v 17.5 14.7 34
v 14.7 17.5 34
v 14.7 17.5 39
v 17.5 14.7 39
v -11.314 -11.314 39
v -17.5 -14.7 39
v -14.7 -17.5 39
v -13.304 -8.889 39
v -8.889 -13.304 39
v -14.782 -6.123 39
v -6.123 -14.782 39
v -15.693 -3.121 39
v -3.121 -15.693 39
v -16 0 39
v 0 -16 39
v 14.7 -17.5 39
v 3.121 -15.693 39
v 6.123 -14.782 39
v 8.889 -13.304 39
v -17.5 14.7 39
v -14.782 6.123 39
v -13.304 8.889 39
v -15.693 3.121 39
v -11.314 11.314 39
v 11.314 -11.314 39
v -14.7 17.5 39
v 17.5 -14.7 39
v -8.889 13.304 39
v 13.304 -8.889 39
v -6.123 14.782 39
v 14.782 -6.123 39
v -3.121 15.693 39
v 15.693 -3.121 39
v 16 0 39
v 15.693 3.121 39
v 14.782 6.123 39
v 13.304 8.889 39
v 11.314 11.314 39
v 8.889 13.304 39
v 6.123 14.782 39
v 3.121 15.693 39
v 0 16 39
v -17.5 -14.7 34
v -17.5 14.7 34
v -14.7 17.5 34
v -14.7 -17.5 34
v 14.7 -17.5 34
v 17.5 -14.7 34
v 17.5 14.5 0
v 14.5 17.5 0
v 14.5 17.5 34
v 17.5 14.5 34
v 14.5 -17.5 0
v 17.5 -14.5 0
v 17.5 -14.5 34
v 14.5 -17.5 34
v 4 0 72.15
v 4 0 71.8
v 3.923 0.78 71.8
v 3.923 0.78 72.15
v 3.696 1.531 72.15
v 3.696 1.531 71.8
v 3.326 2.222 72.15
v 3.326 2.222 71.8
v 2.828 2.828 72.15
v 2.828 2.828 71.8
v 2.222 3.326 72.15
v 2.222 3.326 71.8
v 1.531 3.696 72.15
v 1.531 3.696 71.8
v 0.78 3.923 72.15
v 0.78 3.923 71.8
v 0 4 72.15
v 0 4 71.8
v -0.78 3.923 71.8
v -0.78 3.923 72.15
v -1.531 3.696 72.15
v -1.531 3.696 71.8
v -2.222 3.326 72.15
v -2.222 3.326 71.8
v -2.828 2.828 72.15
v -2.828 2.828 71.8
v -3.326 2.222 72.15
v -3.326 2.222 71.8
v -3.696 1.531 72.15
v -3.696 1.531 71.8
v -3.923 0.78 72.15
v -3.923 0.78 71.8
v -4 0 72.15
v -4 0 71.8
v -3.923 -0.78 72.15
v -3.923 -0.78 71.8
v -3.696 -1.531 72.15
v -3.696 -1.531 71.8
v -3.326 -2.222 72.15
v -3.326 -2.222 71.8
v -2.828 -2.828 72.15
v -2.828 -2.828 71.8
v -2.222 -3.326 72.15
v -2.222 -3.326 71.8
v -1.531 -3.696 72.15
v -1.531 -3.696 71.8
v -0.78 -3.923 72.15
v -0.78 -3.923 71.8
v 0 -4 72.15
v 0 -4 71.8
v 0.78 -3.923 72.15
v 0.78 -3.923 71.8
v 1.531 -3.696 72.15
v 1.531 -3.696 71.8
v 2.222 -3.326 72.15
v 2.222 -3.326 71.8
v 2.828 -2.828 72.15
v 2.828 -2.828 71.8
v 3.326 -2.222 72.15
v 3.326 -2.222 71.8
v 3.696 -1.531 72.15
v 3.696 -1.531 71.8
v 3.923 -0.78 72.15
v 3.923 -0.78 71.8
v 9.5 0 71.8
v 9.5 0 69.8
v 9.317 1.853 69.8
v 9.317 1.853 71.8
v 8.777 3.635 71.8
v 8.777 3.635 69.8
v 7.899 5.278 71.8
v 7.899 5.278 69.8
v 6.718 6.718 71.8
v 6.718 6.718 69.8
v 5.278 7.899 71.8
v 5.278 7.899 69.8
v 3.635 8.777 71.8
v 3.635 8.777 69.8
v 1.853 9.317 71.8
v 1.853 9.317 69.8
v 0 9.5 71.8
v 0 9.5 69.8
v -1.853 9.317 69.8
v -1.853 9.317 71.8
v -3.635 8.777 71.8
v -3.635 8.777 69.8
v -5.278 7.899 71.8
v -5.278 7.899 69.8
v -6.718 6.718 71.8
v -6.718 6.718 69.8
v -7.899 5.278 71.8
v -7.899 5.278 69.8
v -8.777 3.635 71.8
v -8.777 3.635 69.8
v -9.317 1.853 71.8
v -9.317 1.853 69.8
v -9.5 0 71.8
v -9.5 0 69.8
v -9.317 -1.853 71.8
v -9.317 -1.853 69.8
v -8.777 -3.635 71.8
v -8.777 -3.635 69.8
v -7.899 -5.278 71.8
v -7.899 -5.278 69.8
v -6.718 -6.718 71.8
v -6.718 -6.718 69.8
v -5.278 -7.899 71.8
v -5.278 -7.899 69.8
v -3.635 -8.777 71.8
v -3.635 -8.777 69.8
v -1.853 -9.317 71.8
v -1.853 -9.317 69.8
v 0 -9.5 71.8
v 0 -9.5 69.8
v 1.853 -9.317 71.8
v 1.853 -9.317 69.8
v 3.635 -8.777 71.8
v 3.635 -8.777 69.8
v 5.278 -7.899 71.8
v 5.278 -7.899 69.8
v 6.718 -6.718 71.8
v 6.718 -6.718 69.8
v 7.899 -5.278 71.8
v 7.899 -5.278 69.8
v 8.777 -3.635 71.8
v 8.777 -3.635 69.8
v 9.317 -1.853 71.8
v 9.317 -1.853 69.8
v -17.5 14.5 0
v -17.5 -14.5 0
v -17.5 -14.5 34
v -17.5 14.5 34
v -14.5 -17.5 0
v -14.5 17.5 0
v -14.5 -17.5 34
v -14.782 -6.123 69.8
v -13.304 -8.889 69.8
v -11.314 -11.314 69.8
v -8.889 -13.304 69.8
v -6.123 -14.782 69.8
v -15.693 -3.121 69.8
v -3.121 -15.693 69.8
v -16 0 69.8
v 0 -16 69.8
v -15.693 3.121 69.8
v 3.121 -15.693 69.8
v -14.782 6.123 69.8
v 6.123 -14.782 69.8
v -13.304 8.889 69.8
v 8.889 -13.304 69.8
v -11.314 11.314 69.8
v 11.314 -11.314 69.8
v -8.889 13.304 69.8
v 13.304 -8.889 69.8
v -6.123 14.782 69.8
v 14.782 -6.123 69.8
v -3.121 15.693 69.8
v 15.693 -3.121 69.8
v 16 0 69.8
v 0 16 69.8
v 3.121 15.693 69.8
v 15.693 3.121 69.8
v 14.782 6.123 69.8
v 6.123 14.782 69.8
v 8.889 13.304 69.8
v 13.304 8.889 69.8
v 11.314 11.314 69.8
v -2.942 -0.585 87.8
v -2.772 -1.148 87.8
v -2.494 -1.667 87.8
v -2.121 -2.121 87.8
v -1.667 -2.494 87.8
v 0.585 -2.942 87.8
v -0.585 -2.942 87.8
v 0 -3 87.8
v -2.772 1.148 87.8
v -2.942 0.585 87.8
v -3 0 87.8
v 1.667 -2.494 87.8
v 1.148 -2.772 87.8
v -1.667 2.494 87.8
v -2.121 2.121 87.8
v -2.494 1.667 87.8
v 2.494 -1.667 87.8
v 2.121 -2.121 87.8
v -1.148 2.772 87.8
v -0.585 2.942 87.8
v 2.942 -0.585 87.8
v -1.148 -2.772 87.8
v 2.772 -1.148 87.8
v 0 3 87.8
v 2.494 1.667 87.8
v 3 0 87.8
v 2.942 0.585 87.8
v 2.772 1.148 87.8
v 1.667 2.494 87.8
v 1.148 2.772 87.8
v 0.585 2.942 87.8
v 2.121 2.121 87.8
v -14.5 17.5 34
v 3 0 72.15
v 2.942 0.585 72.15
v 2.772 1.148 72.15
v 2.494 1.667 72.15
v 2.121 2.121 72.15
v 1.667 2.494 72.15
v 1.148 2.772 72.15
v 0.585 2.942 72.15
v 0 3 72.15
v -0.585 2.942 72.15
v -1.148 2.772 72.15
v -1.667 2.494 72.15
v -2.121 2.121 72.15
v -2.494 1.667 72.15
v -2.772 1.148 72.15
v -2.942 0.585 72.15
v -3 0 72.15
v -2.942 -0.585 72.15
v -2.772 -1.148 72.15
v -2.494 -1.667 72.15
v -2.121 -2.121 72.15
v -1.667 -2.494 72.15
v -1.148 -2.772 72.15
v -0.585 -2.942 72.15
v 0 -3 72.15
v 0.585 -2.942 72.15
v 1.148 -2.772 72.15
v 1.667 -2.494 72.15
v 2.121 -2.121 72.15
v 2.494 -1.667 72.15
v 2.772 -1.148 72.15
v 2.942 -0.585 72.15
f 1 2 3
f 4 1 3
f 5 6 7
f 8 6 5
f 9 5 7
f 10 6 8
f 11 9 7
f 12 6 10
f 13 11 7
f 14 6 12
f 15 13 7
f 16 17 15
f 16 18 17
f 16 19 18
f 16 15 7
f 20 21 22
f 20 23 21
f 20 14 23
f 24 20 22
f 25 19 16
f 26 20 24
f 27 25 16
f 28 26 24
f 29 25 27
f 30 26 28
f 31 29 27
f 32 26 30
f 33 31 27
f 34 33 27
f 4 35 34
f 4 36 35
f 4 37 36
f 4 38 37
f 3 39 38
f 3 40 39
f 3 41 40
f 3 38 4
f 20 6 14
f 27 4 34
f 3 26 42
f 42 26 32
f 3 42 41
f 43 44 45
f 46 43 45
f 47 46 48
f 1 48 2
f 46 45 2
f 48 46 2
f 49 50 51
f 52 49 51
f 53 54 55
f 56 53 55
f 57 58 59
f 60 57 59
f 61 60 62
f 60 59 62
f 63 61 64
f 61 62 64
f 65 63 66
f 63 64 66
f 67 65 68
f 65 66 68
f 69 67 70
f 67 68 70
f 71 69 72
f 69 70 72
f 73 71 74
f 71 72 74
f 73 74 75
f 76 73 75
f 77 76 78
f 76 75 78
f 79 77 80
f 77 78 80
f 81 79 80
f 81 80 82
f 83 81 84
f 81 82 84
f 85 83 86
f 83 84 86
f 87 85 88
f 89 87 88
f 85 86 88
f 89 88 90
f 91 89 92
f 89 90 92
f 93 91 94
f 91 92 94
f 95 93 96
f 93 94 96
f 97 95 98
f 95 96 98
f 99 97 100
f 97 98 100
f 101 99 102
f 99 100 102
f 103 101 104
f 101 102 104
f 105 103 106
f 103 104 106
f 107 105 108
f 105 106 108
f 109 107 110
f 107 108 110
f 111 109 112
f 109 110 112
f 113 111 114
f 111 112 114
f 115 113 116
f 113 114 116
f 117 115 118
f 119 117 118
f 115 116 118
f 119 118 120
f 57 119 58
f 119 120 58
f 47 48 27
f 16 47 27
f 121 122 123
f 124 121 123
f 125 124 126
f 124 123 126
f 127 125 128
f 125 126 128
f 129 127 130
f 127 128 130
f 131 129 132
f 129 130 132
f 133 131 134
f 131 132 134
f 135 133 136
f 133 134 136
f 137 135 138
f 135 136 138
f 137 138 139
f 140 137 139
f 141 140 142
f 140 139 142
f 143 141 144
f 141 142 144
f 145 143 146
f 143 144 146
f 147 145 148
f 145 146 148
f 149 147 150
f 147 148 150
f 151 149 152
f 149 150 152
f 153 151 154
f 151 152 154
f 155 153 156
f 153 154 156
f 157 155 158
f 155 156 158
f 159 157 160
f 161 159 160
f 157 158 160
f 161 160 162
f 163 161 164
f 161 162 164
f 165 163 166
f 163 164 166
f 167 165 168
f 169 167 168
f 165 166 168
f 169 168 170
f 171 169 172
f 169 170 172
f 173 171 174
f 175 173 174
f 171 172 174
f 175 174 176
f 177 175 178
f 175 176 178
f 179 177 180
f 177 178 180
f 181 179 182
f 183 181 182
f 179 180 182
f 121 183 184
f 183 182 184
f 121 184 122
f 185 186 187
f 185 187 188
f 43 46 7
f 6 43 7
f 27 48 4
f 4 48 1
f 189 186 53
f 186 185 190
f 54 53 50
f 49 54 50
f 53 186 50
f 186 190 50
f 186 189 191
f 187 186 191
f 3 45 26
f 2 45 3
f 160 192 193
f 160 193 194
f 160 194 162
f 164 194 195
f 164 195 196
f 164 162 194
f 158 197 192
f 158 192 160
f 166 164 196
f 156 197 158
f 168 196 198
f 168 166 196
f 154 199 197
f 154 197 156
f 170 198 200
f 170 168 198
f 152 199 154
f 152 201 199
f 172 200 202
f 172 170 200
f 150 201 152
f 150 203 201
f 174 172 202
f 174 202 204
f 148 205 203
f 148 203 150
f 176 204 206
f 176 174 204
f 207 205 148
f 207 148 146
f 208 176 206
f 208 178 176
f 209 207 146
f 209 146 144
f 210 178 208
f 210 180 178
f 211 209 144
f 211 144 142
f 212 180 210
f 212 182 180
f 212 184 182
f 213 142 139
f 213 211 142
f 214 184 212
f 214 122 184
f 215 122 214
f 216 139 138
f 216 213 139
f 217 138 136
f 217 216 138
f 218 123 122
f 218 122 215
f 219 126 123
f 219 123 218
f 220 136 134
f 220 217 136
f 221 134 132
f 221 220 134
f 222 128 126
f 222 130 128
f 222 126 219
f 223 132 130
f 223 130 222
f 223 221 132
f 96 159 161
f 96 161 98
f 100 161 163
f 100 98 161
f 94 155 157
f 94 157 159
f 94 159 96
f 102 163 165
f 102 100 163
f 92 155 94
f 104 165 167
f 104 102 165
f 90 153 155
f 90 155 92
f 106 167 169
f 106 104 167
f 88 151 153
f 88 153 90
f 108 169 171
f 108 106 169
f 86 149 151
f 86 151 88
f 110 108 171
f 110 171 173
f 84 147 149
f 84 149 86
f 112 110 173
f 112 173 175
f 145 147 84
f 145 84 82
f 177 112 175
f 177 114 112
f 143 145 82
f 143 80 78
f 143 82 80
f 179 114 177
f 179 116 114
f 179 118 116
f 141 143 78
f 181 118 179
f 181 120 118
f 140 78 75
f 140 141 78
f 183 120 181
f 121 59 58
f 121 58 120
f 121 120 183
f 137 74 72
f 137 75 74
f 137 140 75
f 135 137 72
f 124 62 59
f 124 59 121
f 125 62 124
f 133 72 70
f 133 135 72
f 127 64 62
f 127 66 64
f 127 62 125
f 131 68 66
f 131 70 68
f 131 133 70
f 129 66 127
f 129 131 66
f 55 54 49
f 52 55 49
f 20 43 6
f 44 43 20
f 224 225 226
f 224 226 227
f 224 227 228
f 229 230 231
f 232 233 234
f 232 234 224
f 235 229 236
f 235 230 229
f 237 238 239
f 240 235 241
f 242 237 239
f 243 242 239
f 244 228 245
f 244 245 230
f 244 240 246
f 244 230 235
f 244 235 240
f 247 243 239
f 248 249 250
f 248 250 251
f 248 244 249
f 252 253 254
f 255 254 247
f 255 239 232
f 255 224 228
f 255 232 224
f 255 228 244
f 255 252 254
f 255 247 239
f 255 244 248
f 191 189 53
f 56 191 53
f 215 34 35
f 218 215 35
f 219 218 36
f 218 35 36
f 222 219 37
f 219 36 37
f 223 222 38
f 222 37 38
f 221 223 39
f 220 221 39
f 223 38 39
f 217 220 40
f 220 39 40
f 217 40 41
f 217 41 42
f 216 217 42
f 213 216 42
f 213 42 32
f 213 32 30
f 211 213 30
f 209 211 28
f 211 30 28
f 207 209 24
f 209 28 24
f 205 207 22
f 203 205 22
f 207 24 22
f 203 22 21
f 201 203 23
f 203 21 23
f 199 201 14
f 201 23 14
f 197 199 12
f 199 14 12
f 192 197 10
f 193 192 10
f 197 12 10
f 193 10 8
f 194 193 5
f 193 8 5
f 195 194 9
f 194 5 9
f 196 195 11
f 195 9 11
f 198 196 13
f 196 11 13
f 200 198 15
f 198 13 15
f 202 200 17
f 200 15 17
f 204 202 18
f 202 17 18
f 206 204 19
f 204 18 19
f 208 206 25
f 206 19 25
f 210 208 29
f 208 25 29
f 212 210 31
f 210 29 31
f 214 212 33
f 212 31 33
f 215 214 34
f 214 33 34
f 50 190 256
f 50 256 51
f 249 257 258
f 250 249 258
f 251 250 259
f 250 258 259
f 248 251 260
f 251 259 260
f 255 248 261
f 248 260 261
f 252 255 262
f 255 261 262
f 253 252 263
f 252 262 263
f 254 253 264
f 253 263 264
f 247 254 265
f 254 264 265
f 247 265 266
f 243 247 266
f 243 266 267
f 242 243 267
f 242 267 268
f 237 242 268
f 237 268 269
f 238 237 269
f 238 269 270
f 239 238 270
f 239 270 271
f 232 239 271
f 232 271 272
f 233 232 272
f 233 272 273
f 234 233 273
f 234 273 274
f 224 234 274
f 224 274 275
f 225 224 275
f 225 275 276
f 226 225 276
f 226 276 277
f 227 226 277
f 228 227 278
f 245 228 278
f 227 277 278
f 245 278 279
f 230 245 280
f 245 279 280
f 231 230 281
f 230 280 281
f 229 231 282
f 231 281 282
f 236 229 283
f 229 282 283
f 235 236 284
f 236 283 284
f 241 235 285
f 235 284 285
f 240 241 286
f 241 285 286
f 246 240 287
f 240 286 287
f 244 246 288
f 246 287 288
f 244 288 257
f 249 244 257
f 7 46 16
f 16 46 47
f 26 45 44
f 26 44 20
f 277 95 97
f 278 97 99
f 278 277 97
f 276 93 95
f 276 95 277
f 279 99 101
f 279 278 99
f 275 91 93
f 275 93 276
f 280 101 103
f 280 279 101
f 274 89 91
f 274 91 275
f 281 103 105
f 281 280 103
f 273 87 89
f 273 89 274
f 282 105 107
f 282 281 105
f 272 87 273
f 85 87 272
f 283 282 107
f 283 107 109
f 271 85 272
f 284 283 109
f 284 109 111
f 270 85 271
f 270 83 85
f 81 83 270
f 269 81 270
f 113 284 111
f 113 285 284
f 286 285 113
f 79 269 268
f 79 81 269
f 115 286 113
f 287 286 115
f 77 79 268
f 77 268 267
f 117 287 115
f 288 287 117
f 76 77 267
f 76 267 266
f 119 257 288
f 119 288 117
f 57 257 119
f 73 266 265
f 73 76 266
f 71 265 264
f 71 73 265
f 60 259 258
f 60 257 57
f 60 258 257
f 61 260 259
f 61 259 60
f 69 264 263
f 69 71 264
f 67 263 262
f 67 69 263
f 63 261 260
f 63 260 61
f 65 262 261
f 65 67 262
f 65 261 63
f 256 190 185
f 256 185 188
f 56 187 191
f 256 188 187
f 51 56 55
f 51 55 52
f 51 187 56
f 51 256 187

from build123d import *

# Parameters (mm, degrees)
SKETCH1_W           = 35
SKETCH1_H           = 35
BOSS_EXTRUDE1_DEPTH = 34
CHAMFER1_SIZE       = 3
SKETCH2_W           = 35
SKETCH2_H           = 35
BOSS_EXTRUDE2_DEPTH = 5
CHAMFER2_SIZE       = 2.8
SKETCH3_R           = 16
BOSS_EXTRUDE3_DEPTH = 30.8
SKETCH4_R           = 9.5
BOSS_EXTRUDE4_DEPTH = 2
SKETCH6_R           = 3
BOSS_EXTRUDE5_DEPTH = 18
SKETCH7_R           = 4
BOSS_EXTRUDE6_DEPTH = 0.35


with BuildPart() as part:
    # Sketch1 → Boss-Extrude1 (new body)
    with BuildSketch(Plane.XY):
        Rectangle(SKETCH1_W, SKETCH1_H)
    extrude(amount=BOSS_EXTRUDE1_DEPTH)

    # Chamfer1
    chamfer1_edges = [part.edges().sort_by_distance(p)[0] for p in [
        (17.5, -17.5, 17),
        (-17.5, -17.5, 17),
        (-17.5, 17.5, 17),
        (17.5, 17.5, 17),
    ]]
    chamfer(chamfer1_edges, length=CHAMFER1_SIZE)


with BuildPart() as body_2:
    # Sketch2 → Boss-Extrude2 (new body)
    with BuildSketch(Plane.XY.offset(34)):
        Rectangle(SKETCH2_W, SKETCH2_H)
    extrude(amount=BOSS_EXTRUDE2_DEPTH)

    # Chamfer2
    chamfer2_edges = [body_2.edges().sort_by_distance(p)[0] for p in [
        (17.5, -17.5, 36.5),
        (-17.5, -17.5, 36.5),
        (-17.5, 17.5, 36.5),
        (17.5, 17.5, 36.5),
    ]]
    chamfer(chamfer2_edges, length=CHAMFER2_SIZE)

    # Sketch3 → Boss-Extrude3 (add)
    with BuildSketch(Plane.XY.offset(39)):
        Circle(SKETCH3_R)
    extrude(amount=BOSS_EXTRUDE3_DEPTH)

    # Sketch4 → Boss-Extrude4 (add)
    with BuildSketch(Plane.XY.offset(69.8)):
        Circle(SKETCH4_R)
    extrude(amount=BOSS_EXTRUDE4_DEPTH)

    # Sketch6 → Boss-Extrude5 (add)
    with BuildSketch(Plane.XY.offset(69.8)):
        Circle(SKETCH6_R)
    extrude(amount=BOSS_EXTRUDE5_DEPTH)

    # Sketch7 → Boss-Extrude6 (add)
    with BuildSketch(Plane.XY.offset(71.8)):
        Circle(SKETCH7_R)
    extrude(amount=BOSS_EXTRUDE6_DEPTH)


solid = Compound([part.part, body_2.part])
